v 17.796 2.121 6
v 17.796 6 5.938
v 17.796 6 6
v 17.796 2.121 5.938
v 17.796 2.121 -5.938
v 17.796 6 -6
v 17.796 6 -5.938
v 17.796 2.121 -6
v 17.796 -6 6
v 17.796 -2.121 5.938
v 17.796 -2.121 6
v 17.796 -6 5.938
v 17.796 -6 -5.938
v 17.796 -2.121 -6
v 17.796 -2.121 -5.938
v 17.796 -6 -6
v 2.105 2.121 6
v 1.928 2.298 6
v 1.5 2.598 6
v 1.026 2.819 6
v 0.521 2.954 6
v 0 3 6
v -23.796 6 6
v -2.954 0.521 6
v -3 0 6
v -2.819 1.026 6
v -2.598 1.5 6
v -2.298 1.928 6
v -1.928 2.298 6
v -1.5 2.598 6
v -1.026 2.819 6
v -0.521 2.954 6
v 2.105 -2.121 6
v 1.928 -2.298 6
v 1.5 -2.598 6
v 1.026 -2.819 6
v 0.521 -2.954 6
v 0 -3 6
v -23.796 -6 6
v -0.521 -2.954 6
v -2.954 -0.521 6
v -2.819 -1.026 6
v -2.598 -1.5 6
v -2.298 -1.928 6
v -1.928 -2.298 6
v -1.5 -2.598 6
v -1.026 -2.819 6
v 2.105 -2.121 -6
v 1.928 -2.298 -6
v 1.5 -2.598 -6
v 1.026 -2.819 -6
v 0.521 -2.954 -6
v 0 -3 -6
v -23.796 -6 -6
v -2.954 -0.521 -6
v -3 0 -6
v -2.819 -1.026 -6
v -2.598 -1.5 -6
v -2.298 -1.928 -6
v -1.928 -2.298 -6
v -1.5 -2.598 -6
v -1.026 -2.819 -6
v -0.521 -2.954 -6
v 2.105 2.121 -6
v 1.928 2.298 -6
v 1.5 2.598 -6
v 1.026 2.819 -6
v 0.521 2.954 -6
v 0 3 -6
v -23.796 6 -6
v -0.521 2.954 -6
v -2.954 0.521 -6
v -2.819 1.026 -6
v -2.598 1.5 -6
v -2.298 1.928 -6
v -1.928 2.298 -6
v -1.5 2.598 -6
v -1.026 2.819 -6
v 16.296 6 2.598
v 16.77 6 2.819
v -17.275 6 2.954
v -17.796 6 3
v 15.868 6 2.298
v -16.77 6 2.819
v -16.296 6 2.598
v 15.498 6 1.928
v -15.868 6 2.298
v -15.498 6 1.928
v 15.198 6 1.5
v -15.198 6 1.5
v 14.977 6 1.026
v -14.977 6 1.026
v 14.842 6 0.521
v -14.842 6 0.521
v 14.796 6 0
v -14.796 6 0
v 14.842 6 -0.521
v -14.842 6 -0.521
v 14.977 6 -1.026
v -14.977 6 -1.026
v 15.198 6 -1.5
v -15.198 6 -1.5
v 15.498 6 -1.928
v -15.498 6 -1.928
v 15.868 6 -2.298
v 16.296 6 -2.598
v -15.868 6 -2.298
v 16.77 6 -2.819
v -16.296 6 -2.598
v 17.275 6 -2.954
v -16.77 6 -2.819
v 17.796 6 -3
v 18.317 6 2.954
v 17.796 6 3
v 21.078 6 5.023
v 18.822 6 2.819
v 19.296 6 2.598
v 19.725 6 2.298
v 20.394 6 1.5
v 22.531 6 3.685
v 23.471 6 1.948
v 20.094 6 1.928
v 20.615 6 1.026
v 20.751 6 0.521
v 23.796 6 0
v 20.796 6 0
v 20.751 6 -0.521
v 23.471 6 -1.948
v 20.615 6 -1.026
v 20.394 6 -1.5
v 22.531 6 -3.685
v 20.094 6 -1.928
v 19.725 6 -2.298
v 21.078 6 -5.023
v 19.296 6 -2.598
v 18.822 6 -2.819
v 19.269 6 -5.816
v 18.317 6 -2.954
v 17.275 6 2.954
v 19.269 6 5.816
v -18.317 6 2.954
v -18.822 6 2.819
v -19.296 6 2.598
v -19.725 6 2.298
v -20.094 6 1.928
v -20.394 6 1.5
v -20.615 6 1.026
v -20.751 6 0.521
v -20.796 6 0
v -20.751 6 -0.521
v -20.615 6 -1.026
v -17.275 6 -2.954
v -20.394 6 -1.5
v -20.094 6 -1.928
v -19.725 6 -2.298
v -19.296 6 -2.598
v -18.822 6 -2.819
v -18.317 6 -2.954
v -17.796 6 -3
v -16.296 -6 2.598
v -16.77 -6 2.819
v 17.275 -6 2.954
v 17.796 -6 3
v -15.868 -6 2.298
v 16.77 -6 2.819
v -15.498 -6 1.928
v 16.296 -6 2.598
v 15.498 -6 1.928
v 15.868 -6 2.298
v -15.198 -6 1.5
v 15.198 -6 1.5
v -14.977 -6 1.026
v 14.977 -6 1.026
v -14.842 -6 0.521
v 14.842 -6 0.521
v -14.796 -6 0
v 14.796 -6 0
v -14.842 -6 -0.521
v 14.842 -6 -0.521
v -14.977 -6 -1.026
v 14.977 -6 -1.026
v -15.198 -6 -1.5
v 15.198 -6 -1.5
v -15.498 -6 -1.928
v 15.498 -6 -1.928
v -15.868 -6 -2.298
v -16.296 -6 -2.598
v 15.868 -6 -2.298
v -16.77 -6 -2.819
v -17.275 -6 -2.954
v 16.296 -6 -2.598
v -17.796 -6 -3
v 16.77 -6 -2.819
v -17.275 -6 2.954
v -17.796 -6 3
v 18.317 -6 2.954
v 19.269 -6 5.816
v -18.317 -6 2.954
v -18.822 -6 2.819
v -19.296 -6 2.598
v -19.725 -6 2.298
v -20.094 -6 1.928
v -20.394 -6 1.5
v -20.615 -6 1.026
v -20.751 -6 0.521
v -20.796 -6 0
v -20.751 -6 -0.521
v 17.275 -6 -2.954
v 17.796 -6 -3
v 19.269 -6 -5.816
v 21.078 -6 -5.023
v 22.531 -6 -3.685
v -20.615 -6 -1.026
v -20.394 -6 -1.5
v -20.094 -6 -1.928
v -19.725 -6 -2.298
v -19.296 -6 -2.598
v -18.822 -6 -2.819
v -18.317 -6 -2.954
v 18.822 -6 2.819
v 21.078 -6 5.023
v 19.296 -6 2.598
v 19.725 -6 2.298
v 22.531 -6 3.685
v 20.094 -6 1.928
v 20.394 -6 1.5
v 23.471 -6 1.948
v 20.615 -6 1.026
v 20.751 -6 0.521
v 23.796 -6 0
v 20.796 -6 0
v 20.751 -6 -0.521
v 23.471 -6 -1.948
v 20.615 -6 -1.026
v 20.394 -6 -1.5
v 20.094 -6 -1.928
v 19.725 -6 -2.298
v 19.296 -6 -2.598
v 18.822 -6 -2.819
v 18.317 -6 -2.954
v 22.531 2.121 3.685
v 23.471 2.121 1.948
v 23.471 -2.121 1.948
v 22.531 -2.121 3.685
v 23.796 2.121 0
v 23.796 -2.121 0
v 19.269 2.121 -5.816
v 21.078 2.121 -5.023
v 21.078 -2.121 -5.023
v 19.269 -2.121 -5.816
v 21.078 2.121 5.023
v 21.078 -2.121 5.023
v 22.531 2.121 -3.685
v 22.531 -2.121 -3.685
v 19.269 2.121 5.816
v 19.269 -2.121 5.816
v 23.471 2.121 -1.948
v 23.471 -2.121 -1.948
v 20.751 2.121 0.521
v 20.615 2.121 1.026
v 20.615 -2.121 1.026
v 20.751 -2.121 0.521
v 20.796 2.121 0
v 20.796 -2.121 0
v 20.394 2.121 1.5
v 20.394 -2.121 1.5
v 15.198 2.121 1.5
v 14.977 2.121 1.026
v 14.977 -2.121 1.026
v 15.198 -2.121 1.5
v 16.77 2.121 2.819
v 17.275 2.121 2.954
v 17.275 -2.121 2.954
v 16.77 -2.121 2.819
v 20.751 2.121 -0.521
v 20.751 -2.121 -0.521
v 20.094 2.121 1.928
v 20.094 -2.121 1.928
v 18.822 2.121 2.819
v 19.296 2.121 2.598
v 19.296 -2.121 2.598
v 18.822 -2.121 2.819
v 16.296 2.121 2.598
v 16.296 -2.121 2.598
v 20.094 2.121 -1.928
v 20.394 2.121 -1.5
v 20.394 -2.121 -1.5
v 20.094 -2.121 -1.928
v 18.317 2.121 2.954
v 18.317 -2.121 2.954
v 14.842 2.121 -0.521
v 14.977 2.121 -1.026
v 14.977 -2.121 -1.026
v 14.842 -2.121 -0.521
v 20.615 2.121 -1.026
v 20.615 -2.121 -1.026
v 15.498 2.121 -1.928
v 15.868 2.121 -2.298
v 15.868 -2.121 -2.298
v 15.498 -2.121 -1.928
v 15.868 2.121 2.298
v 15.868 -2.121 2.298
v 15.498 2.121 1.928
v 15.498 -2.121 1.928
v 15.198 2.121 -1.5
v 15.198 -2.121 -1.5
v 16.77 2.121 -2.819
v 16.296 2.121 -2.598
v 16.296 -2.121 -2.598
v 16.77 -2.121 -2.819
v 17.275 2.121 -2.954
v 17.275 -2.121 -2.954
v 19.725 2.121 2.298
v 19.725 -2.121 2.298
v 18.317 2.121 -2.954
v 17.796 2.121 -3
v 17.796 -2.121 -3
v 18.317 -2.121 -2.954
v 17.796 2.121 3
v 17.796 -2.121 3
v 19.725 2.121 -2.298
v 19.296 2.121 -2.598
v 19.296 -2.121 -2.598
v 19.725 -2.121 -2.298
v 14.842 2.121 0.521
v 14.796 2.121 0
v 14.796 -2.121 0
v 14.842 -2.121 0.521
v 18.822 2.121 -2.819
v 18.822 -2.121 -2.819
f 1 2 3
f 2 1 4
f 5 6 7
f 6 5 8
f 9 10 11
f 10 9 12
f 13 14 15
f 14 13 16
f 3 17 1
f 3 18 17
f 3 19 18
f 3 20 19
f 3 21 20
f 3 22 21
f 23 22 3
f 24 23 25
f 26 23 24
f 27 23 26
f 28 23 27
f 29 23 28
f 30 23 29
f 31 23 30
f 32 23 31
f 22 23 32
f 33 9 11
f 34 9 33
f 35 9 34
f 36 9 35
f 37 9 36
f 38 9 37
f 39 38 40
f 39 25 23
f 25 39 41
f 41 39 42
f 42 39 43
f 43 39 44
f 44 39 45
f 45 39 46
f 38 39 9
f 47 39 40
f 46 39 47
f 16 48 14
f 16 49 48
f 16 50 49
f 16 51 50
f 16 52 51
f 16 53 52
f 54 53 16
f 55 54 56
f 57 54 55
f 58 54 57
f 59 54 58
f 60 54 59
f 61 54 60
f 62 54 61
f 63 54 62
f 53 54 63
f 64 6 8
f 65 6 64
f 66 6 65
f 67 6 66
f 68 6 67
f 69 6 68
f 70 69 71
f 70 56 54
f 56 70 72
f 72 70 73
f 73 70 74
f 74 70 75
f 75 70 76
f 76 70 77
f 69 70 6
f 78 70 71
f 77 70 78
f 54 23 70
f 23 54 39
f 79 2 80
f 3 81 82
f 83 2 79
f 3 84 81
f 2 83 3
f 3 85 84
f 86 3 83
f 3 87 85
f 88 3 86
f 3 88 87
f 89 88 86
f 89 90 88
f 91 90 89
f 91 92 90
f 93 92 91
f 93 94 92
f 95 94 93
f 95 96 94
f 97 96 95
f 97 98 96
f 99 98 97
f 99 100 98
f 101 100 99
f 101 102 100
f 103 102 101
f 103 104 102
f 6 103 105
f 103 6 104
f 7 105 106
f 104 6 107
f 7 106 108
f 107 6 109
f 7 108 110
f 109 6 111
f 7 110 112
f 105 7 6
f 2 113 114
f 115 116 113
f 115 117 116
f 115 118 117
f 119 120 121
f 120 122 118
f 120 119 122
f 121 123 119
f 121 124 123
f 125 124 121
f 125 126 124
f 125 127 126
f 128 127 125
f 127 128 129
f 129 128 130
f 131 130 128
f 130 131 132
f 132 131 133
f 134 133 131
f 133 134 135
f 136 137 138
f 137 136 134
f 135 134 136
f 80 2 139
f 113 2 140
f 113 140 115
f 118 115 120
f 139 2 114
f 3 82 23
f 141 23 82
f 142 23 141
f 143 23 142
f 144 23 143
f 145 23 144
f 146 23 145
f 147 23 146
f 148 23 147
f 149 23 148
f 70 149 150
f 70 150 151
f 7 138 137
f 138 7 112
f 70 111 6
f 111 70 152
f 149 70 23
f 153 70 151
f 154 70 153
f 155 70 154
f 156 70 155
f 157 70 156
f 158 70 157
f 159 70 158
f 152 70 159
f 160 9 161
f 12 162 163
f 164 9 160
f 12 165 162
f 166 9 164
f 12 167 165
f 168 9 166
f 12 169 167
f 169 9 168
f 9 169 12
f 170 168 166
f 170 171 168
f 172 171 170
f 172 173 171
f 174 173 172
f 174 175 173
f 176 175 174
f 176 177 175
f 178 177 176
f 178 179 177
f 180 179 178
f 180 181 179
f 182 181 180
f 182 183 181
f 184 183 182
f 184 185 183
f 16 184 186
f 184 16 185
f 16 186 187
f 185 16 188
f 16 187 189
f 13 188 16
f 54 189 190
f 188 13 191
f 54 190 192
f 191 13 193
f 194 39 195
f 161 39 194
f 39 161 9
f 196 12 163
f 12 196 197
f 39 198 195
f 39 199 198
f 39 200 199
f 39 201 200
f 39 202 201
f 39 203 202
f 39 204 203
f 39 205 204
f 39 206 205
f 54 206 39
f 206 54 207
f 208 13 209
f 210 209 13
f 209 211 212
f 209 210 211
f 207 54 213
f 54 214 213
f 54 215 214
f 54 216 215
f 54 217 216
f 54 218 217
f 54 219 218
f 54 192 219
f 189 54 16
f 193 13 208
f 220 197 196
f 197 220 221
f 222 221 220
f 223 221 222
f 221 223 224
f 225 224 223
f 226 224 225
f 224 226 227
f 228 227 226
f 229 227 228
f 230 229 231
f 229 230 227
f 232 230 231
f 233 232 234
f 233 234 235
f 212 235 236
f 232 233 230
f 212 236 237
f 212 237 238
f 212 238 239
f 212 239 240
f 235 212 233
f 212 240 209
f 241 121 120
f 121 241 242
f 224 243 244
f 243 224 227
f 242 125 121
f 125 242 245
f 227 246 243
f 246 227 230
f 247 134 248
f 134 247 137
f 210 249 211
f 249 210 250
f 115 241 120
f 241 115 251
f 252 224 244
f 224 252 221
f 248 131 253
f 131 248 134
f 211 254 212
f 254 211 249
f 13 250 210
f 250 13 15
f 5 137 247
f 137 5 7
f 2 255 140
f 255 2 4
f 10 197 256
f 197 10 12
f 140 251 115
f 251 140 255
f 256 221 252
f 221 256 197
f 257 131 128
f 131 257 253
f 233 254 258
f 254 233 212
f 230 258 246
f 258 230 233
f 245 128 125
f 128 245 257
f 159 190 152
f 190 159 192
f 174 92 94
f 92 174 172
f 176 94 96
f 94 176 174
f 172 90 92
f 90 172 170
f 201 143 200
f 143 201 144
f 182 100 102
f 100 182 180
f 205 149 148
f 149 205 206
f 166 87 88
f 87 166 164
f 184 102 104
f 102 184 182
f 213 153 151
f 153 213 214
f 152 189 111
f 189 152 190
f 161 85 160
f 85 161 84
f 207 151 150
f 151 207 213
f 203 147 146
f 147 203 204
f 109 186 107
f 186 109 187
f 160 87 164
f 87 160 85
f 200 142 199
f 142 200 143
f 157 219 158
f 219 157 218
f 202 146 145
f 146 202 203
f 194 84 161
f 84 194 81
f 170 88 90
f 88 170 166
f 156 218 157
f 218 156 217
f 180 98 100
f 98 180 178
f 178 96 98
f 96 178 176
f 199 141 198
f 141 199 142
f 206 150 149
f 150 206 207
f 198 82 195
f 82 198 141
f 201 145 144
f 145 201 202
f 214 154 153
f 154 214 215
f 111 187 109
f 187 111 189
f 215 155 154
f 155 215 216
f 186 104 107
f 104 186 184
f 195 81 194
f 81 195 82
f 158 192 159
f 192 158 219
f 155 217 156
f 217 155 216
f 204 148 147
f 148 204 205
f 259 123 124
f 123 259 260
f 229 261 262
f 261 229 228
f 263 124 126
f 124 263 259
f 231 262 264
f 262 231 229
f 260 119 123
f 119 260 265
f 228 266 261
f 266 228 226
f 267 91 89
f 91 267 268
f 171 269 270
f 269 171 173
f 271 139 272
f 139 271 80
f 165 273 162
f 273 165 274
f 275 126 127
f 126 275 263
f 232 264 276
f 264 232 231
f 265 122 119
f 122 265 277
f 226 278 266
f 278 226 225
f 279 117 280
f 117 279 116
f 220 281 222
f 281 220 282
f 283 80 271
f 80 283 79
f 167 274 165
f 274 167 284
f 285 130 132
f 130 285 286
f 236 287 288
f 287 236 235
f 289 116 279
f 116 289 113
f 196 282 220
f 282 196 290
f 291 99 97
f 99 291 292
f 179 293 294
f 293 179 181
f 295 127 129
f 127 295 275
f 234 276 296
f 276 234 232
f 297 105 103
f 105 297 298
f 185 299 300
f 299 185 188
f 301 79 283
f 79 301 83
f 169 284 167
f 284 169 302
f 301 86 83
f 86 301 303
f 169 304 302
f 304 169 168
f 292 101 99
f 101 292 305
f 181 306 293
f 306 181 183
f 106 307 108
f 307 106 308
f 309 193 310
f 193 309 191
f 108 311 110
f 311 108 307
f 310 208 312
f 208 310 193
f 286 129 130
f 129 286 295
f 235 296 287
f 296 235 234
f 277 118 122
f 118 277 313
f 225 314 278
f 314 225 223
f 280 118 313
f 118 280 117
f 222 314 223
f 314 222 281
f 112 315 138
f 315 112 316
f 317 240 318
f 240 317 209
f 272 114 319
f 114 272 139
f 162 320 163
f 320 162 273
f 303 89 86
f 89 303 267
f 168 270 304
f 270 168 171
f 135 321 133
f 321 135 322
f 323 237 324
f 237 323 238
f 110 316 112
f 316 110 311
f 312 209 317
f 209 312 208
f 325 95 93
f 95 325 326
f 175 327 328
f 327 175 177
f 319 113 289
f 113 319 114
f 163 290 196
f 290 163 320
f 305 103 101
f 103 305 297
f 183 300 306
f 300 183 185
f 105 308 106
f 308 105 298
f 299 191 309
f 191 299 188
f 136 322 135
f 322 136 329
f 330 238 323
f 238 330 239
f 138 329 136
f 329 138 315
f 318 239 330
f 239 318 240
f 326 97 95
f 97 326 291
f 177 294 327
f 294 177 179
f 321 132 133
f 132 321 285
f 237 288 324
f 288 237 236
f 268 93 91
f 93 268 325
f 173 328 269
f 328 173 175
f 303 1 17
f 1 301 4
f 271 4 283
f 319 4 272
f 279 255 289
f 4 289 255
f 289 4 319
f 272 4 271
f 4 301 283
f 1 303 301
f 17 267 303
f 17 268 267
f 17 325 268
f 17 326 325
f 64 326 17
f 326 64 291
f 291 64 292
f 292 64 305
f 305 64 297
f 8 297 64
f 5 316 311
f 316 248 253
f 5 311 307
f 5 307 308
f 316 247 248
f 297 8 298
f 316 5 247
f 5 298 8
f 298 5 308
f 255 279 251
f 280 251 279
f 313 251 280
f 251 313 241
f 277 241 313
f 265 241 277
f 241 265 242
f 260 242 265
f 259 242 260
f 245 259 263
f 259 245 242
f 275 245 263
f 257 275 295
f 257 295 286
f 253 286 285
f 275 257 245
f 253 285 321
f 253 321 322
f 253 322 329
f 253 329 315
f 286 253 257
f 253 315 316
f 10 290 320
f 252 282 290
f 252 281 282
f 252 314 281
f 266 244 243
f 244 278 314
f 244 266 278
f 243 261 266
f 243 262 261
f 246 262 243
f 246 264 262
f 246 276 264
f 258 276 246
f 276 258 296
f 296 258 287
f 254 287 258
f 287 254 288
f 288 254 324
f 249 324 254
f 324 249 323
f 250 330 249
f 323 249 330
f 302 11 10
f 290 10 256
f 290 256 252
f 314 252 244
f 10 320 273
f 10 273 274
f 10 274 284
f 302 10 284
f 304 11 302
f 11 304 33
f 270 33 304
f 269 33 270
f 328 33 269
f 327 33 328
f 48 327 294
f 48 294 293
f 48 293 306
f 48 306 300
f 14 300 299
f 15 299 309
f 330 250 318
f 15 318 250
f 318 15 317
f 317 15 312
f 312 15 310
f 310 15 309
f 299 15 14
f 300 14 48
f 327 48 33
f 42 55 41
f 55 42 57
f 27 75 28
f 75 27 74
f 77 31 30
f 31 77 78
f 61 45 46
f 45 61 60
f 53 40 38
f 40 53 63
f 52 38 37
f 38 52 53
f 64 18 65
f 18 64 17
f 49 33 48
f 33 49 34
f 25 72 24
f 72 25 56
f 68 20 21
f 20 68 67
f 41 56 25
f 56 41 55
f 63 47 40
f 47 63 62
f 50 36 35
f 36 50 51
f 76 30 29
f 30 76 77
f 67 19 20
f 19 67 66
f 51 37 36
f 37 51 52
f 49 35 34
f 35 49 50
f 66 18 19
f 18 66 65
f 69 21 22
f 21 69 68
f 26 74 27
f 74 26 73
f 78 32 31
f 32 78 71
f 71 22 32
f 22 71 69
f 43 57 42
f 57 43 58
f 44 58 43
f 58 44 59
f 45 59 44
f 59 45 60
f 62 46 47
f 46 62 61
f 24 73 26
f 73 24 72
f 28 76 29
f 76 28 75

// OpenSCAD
// file: hardware.scad
include <settings.scad>;


module rod(length, threaded) if (threaded && renderrodthreads) {
	linear_extrude(height = length, center = true, convexity = 10, twist = -360 * length / rodpitch, $fn = fn)
		translate([rodsize * 0.1 / 2, 0, 0])
			circle(r = rodsize * 0.9 / 2, $fn = fn);
} else cylinder(h = length, r = rodsize / 2, center = true, $fn = fn);


module rodnut(position, washer) render() translate([0, 0, position]) {
	intersection() {
		scale([1, 1, 0.5]) sphere(r = 1.05 * rodsize, center = true);
		difference() {
			cylinder (h = rodnutsize, r = rodnutdiameter / 2, center = true, $fn = 6);
			rod(rodnutsize + 0.1);
		}
	}
	if (washer == 1 || washer == 4) rodwasher(((position > 0) ? -1 : 1) * (rodnutsize + rodwashersize) / 2);
	if (washer == 2 || washer == 4) rodwasher(((position > 0) ? 1 : -1) * (rodnutsize + rodwashersize) / 2);
}


module rodwasher(position) render() translate ([0, 0, position]) difference() {
	cylinder(r = rodwasherdiameter / 2, h = rodwashersize, center = true, $fn = fn);
	rod(rodwashersize + 0.1);
}


module screw(length, nutpos, washer, bearingpos = -1) union(){
	translate([0, 0, -length / 2]) if (renderscrewthreads) {
		linear_extrude(height = length, center = true, convexity = 10, twist = -360 * length / screwpitch, $fn = fn)
			translate([screwsize * 0.1 / 2, 0, 0])
				circle(r = screwsize * 0.9 / 2, $fn = fn);
	} else cylinder(h = length, r = screwsize / 2, center = true, $fn = fn);
	render() difference() {
		translate([0, 0, screwsize / 2]) cylinder(h = screwsize, r = screwsize, center = true, $fn = fn);
		translate([0, 0, screwsize]) cylinder(h = screwsize, r = screwsize / 2, center = true, $fn = 6);
	}
	if (washer > 0 && nutpos > 0) {
		washer(nutpos);
		nut(nutpos + washersize);
	} else if (nutpos > 0) nut(nutpos);
	if (bearingpos >= 0) bearing(bearingpos);
}


module bearing(position) render() translate([0, 0, -position - bearingwidth / 2]) union() {
	difference() {
		cylinder(h = bearingwidth, r = bearingsize / 2, center = true, $fn = fn);
		cylinder(h = bearingwidth * 2, r = bearingsize / 2 - 1, center = true, $fn = fn);
	}
	difference() {
		cylinder(h = bearingwidth - 0.5, r = bearingsize / 2 - 0.5, center = true, $fn = fn);
		cylinder(h = bearingwidth * 2, r = screwsize / 2 + 0.5, center = true, $fn = fn);
	}
	difference() {
		cylinder(h = bearingwidth, r = screwsize / 2 + 1, center = true, $fn = fn);
		cylinder(h = bearingwidth + 0.1, r = screwsize / 2, center = true, $fn = fn);
	}
}


module nut(position, washer) render() translate([0, 0, -position - nutsize / 2]) {
	intersection() {
		scale([1, 1, 0.5]) sphere(r = 1.05 * screwsize, center = true);
		difference() {
			cylinder (h = nutsize, r = nutdiameter / 2, center = true, $fn = 6);
			cylinder(r = screwsize / 2, h = nutsize + 0.1, center = true, $fn = fn);
		}
	}
	if (washer > 0) washer(0);
}


module washer(position) render() translate ([0, 0, -position - washersize / 2]) difference() {
	cylinder(r = washerdiameter / 2, h = washersize, center = true, $fn = fn);
	cylinder(r = screwsize / 2, h = washersize + 0.1, center = true, $fn = fn);
}


rod(20);
translate([rodsize * 2.5, 0, 0]) rod(20, true);
translate([rodsize * 5, 0, 0]) screw(10, true);
translate([rodsize * 7.5, 0, 0]) bearing();
translate([rodsize * 10, 0, 0]) rodnut();
translate([rodsize * 12.5, 0, 0]) rodwasher();
translate([rodsize * 15, 0, 0]) nut();
translate([rodsize * 17.5, 0, 0]) washer();
// file: settings.scad
rodsize = 6;	//threaded/smooth rod diameter in mm
xaxis = 182.5;	//width of base in mm
yaxis = 266.5;	//length of base in mm


screwsize = 3;	//bearing bore/screw diameter in mm
bearingsize = 10;	//outer diameter of bearings in mm
bearingwidth = 4;	//width of bearings in mm


rodpitch = rodsize / 6;
rodnutsize = 0.8 * rodsize;
rodnutdiameter = 1.9 * rodsize;
rodwashersize = 0.2 * rodsize;
rodwasherdiameter = 2 * rodsize;
screwpitch = screwsize / 6;
nutsize = 0.8 * screwsize;
nutdiameter = 1.9 * screwsize;
washersize = 0.2 * screwsize;
washerdiameter = 2 * screwsize;
partthick = 2 * rodsize;
vertexrodspace = 2 * rodsize;


c = [0.3, 0.3, 0.3];
rodendoffset = rodnutsize + rodwashersize * 2 + partthick / 2;
vertexoffset = vertexrodspace + rodendoffset;


renderrodthreads = false;
renderscrewthreads = false;
fn = 36;
// main file
include <settings.scad>;
use <hardware.scad>;

module z_top() color(c) difference() {
	union() {
		translate([-partthick / 4, 0, 0]) cube([(vertexoffset / 2 + rodsize * sqrt(3) / 2) * 2 + partthick / 2, partthick, partthick], center = true);
		rotate([90, 0, 0]) translate([vertexoffset / 2 + rodsize * sqrt(3) / 2, 0, 0]) cylinder(r = partthick / 2, h = partthick, center = true);
	}
	translate([((vertexoffset / 2 + rodsize * sqrt(3) / 2) + partthick / 2) / 2, 0, 0]) cube([(vertexoffset / 2 + rodsize * sqrt(3) / 2) + partthick / 2 + 0.1, rodsize * sin(45), partthick + 0.1], center = true);
	rotate([90, 0, 0]) for(side = [1, -1]) {
		translate([-side * (vertexoffset / 2 + rodsize * sqrt(3) / 2), 0, 0]) rod(partthick * 2);
	}
	rod(partthick + 0.1);
}

z_top();
